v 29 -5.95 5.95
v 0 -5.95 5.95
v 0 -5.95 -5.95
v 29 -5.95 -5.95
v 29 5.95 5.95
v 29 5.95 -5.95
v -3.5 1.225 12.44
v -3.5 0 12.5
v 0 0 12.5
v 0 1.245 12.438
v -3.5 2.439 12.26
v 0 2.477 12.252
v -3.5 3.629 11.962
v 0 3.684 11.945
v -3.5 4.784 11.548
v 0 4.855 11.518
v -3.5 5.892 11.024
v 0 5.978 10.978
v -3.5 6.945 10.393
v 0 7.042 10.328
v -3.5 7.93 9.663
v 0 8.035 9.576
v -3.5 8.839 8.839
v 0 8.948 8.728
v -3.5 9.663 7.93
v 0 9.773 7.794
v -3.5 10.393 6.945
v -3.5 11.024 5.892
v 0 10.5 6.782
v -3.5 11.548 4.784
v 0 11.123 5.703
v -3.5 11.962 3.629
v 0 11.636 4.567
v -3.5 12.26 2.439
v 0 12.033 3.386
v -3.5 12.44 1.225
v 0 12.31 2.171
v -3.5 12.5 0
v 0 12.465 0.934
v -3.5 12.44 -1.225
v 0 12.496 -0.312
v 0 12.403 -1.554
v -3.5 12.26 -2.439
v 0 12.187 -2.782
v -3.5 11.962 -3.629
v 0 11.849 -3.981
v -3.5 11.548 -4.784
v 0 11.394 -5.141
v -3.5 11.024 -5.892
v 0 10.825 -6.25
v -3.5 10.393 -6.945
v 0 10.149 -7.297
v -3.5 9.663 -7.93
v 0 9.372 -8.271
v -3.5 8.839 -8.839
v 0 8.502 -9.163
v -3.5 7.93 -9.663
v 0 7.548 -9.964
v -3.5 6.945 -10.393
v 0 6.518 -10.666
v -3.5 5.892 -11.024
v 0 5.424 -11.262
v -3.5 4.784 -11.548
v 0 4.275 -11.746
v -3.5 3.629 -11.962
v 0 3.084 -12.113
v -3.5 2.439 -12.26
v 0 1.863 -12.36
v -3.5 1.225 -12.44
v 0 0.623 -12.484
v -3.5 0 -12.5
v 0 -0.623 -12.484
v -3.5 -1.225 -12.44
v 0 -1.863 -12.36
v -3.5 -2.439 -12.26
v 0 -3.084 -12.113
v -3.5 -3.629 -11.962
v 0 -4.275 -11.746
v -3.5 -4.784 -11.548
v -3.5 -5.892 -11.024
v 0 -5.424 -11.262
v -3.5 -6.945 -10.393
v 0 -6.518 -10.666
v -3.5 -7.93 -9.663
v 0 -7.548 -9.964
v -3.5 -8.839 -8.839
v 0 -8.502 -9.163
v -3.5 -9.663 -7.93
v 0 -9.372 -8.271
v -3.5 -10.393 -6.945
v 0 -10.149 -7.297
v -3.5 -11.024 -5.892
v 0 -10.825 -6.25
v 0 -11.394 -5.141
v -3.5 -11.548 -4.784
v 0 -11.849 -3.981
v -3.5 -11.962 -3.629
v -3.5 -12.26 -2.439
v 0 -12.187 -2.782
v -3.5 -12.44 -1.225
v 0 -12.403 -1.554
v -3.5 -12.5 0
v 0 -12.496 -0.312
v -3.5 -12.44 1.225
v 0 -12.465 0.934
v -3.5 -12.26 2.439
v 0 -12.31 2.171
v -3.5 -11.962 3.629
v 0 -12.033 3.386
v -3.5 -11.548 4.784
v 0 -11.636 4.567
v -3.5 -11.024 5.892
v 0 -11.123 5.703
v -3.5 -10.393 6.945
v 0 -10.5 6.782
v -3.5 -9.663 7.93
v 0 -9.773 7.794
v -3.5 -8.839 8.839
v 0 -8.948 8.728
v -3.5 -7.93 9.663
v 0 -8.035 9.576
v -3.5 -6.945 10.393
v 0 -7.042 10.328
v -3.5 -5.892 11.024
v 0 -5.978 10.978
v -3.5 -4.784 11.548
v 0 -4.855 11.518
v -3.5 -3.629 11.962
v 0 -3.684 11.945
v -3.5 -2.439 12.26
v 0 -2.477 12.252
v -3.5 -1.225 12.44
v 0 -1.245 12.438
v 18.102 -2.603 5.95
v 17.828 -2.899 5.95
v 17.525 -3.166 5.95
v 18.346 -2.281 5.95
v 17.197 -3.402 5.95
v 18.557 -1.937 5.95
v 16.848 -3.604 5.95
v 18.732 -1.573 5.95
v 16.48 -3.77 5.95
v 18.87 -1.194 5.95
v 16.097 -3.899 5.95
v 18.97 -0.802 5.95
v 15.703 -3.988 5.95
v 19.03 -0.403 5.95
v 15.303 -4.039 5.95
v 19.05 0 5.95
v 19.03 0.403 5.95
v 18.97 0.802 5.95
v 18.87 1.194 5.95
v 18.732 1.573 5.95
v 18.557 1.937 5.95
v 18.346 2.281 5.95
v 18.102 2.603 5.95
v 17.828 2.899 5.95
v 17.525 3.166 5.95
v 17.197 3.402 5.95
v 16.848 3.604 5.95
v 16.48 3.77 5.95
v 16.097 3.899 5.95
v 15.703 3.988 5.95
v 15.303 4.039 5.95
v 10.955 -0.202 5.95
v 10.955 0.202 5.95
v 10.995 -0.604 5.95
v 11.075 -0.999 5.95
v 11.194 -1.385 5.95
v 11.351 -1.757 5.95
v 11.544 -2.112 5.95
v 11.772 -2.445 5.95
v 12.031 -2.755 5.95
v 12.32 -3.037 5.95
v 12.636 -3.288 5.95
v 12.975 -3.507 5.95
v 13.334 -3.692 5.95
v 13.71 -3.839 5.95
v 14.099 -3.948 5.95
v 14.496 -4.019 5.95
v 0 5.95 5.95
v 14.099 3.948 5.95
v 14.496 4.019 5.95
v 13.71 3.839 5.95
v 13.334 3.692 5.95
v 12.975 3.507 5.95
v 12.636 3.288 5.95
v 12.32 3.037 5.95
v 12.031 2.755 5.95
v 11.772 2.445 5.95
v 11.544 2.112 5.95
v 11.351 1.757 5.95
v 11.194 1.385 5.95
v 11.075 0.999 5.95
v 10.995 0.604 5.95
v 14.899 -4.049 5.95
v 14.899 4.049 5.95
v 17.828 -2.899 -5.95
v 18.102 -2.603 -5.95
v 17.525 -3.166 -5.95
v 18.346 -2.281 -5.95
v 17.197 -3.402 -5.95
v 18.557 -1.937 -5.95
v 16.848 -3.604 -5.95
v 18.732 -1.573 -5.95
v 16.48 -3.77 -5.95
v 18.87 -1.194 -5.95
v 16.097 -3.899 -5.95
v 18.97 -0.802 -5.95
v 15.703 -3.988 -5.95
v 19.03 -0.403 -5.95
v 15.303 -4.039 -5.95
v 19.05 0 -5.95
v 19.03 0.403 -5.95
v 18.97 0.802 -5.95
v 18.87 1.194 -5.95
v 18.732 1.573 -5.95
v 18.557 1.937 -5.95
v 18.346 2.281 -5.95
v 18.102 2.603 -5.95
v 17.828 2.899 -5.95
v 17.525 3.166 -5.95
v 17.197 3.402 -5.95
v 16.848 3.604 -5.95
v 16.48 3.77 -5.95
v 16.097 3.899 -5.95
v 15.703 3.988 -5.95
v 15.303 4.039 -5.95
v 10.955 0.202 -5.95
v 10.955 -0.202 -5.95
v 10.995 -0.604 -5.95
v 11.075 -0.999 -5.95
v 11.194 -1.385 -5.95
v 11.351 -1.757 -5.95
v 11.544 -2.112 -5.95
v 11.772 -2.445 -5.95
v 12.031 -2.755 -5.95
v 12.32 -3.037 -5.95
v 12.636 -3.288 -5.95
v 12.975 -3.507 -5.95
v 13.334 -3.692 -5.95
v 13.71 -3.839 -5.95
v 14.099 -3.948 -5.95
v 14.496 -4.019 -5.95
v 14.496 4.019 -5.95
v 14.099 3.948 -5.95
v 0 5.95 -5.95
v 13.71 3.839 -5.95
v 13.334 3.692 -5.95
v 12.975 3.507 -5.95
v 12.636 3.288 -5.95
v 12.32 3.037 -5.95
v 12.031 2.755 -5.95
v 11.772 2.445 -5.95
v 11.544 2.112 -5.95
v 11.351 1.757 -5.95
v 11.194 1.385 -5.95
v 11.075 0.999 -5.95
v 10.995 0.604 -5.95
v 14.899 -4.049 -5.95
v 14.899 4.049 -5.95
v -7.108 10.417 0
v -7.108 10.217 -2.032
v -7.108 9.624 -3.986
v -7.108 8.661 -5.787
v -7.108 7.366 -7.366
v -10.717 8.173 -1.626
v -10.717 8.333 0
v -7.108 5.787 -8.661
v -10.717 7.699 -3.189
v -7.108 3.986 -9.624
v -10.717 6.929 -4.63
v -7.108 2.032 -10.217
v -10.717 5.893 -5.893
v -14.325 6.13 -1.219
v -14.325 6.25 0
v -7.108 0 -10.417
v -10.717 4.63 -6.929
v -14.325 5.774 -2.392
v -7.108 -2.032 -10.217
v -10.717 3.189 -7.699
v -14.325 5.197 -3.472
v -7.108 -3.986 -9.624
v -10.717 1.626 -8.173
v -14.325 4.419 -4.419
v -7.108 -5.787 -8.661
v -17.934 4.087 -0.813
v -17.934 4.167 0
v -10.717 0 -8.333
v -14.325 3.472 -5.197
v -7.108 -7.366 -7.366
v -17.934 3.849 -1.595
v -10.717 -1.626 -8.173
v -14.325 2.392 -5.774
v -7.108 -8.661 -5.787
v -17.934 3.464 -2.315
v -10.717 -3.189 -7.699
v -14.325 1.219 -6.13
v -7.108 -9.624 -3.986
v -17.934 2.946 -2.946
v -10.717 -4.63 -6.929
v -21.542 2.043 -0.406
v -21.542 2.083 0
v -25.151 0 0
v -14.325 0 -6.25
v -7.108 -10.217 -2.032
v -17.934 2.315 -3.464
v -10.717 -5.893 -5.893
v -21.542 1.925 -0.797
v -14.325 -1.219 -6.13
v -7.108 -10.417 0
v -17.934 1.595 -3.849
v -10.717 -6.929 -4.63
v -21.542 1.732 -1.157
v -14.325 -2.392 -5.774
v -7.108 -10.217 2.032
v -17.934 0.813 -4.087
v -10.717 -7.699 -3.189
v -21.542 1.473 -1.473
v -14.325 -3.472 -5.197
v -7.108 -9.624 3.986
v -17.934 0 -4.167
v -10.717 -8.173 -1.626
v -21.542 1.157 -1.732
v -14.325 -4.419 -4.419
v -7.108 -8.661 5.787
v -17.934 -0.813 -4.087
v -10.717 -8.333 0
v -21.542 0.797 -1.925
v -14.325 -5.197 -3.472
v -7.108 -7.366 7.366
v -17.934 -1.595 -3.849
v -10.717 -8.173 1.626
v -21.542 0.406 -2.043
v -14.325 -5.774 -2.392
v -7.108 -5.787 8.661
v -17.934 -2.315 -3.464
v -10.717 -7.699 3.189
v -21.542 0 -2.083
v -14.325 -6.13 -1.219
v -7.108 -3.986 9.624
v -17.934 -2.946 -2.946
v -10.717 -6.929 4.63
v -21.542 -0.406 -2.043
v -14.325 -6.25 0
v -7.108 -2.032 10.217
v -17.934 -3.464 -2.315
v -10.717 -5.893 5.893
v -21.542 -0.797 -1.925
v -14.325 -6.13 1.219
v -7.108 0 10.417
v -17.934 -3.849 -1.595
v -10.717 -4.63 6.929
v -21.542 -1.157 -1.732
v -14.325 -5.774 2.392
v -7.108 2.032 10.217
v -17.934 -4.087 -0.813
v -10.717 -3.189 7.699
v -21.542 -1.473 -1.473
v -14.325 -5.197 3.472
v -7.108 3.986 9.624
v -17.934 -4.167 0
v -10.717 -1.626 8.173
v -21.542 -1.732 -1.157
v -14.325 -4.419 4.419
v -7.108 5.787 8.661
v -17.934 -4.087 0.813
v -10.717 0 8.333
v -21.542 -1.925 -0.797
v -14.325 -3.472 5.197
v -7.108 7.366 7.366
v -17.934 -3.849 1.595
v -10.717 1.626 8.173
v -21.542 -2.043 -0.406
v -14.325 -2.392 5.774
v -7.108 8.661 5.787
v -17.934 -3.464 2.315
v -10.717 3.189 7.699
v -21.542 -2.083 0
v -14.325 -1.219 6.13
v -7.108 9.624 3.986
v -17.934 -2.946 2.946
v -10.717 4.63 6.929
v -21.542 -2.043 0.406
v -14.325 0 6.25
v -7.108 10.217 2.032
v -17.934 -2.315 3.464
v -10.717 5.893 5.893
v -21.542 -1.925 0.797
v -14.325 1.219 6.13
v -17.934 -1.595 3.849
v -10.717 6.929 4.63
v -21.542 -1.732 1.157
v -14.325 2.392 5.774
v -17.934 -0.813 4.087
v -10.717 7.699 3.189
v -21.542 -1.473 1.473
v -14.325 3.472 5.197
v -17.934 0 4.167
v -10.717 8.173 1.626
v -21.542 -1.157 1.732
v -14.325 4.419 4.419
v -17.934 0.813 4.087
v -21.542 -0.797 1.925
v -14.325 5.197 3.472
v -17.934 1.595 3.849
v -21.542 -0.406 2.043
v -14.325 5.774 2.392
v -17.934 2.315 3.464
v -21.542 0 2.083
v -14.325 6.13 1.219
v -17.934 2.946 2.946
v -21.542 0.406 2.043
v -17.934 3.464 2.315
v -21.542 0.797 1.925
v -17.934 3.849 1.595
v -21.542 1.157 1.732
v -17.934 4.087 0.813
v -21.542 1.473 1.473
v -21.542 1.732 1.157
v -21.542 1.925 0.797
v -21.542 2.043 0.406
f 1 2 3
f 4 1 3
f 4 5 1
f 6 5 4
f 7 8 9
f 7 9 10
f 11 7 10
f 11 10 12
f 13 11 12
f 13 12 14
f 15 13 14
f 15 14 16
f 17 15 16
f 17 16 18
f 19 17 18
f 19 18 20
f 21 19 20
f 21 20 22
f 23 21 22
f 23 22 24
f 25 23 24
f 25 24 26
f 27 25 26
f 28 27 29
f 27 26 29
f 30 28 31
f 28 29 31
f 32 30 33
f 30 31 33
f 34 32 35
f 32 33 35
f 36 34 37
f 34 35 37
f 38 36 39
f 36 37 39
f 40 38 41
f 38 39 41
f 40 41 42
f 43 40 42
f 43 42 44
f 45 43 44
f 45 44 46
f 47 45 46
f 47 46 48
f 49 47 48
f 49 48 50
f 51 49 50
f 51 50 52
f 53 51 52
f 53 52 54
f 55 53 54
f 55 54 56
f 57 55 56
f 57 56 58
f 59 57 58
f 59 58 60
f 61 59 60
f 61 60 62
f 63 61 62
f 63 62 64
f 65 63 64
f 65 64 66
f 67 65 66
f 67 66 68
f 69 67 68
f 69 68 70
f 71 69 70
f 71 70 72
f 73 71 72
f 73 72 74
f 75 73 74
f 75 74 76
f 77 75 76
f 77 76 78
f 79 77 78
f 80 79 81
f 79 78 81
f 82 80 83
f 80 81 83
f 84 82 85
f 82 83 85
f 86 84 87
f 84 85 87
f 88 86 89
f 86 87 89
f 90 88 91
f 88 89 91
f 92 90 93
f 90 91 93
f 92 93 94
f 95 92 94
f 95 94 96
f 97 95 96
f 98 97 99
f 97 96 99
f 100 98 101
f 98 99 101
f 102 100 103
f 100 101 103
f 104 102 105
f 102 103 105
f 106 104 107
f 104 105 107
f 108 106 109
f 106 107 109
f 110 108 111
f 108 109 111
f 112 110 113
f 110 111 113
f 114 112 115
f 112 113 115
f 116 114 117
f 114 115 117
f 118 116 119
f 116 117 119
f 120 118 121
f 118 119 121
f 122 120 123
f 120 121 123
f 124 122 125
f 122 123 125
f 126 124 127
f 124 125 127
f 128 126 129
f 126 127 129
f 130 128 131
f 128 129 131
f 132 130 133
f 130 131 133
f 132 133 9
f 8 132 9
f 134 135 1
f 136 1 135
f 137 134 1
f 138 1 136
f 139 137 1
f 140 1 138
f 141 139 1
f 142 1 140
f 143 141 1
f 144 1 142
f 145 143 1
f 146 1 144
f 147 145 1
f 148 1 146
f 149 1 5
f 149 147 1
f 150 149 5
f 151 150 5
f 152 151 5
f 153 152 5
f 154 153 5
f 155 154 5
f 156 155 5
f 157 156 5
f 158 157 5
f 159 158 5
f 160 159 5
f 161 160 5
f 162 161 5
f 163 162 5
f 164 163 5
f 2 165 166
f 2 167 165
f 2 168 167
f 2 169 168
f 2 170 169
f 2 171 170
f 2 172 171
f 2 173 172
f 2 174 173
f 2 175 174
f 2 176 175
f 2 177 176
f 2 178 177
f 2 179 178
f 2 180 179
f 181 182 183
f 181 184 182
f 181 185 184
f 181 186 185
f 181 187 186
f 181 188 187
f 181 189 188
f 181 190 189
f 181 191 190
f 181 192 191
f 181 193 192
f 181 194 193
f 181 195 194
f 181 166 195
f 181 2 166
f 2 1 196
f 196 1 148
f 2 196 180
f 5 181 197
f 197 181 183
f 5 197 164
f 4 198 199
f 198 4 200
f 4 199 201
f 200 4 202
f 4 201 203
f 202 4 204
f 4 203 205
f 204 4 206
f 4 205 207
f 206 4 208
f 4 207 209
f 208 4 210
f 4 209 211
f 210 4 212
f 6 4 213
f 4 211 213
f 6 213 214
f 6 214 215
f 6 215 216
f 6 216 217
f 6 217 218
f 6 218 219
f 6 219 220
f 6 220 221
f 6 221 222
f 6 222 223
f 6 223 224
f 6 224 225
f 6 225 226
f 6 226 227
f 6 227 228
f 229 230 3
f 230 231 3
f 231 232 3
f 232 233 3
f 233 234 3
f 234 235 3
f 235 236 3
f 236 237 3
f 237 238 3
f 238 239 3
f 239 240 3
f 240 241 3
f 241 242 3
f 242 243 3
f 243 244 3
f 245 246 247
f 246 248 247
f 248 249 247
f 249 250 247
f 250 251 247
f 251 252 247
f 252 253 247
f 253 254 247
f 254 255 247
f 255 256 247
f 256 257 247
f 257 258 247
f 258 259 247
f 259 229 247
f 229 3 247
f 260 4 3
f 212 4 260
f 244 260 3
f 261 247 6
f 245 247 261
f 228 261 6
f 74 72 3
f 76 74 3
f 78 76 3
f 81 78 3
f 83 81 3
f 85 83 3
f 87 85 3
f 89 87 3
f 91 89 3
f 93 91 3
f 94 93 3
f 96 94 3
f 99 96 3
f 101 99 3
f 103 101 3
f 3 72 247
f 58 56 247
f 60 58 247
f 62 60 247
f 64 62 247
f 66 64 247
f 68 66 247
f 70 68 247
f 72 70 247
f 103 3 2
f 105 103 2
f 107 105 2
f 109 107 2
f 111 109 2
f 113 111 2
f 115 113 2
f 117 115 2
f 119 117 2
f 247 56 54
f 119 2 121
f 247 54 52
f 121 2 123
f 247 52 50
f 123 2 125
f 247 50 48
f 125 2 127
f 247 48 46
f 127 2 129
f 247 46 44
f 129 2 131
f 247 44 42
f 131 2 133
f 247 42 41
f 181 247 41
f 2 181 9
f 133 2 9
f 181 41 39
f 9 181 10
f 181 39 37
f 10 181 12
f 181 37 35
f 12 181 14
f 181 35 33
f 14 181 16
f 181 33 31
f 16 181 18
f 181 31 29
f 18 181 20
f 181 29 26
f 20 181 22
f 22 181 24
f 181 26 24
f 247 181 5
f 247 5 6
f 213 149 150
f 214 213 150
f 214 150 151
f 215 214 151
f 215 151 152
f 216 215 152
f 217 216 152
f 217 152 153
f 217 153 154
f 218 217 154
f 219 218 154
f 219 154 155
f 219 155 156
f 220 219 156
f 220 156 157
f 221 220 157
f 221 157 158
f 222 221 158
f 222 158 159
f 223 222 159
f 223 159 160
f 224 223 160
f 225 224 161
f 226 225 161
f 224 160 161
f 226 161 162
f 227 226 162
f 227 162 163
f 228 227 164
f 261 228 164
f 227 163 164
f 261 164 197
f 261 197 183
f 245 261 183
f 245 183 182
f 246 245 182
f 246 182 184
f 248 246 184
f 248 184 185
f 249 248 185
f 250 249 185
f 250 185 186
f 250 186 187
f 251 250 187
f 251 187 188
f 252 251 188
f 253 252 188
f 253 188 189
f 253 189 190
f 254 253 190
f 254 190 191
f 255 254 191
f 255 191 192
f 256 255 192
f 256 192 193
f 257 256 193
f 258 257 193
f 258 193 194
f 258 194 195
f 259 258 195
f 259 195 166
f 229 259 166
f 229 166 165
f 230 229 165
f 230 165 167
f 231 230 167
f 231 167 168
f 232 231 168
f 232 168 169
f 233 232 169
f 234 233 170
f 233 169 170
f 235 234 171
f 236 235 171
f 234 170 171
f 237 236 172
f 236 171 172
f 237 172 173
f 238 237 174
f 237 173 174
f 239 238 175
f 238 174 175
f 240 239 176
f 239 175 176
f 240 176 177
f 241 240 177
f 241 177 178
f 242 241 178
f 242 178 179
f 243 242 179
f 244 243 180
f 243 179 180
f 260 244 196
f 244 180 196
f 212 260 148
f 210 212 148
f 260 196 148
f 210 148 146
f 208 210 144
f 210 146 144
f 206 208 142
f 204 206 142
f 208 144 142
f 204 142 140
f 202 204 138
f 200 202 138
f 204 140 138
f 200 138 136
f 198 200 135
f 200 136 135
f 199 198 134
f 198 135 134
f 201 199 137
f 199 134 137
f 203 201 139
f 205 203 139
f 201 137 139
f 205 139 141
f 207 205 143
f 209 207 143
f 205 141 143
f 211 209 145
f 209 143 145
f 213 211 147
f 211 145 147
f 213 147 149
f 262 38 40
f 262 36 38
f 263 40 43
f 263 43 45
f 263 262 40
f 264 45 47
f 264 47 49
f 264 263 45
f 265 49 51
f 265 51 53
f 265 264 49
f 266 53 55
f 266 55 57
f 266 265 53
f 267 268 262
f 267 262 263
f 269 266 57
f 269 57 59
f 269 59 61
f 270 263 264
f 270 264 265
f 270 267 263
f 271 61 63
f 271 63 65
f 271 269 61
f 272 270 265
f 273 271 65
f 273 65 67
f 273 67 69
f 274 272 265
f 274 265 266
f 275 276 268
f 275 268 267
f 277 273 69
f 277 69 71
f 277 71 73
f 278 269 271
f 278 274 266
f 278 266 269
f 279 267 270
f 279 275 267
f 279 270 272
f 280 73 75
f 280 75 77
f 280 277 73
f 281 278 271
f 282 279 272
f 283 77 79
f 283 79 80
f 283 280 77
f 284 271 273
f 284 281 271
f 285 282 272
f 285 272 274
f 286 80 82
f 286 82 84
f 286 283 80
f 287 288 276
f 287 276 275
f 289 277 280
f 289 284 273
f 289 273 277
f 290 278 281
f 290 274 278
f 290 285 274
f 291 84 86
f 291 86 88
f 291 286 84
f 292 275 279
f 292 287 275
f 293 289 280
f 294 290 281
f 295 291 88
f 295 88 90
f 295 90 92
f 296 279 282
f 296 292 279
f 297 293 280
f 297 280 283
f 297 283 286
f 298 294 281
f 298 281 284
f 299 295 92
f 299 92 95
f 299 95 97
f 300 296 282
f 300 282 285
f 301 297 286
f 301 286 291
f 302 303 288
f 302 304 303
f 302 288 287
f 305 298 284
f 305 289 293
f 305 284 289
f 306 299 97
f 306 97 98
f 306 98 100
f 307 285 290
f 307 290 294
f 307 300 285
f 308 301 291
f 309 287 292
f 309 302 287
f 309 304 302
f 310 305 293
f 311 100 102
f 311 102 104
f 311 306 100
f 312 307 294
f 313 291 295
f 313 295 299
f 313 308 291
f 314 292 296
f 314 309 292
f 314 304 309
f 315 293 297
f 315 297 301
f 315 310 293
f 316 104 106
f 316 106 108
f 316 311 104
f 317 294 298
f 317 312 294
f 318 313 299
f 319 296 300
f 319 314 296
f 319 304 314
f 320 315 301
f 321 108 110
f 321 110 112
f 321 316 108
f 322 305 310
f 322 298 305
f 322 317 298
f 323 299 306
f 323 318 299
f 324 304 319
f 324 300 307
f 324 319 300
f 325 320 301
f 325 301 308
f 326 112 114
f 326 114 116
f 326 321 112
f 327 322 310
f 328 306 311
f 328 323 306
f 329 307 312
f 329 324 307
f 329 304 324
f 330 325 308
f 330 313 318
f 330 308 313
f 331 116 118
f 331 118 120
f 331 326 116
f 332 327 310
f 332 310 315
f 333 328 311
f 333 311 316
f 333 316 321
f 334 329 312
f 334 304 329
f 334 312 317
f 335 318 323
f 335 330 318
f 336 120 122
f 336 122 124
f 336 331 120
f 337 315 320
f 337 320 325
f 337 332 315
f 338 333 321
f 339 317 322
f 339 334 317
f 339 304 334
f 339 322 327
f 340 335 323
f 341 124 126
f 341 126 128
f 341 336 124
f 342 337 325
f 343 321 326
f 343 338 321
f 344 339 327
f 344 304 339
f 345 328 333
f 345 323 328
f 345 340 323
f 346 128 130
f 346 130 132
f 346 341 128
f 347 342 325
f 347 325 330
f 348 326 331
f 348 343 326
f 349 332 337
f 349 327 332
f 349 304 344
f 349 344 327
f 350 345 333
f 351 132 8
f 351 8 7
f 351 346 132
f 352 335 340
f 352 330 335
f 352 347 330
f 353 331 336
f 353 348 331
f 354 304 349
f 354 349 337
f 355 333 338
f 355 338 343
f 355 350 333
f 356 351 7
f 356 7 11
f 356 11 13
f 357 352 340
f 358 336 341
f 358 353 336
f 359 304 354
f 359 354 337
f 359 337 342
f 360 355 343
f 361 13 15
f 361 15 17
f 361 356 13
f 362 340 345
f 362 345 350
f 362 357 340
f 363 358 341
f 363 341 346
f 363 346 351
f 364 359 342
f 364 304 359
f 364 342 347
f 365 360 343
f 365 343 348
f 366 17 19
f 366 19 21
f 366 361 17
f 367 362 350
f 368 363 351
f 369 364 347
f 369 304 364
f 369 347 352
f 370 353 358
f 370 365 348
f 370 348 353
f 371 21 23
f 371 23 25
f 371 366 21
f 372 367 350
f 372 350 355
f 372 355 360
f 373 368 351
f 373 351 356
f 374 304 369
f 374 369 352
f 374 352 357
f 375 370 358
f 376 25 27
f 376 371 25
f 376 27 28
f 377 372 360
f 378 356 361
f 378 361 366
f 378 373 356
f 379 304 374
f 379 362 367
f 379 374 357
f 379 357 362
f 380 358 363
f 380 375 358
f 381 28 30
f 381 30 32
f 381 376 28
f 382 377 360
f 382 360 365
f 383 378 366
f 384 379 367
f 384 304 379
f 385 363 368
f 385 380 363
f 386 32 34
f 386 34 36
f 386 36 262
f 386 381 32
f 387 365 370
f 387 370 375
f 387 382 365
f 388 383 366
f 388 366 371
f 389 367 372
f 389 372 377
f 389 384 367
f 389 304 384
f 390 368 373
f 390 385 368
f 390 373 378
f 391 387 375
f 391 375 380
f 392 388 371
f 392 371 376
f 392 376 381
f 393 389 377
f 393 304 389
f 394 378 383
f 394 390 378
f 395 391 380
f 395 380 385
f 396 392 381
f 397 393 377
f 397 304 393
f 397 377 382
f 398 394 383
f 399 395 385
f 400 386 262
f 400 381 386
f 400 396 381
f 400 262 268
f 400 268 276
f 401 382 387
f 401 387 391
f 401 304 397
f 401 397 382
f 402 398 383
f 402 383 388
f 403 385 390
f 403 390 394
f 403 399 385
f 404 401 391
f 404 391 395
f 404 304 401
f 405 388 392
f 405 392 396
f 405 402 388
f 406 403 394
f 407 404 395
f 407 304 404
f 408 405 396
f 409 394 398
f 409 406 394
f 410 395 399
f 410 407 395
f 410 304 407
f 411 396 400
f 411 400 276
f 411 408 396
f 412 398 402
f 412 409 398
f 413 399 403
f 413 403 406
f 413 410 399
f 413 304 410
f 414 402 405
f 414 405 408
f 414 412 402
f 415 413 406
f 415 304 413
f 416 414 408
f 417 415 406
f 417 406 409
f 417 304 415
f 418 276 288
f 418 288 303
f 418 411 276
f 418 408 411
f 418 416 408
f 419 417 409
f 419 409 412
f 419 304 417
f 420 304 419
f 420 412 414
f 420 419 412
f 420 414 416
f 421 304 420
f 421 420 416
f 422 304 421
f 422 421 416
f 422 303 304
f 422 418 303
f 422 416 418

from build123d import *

# Parameters (mm, degrees)
SKETCH1_W                      = 11.9
SKETCH1_H                      = 11.9
BOSS_EXTRUDE1_DEPTH            = 29
CUT_EXTRUDE1_REACH             = 13.9
SKETCH2_R                      = 4.05
CUT_EXTRUDE1_DIRECTION_2_DEPTH = 1
SKETCH3_R                      = 12.5
BOSS_EXTRUDE2_DEPTH            = 3.5


with BuildPart() as part:
    # Sketch1 → Boss-Extrude1 (new body)
    with BuildSketch(Plane(origin=(0, 0, 0), x_dir=(0, 0, -1), z_dir=(1, 0, 0))):
        Rectangle(SKETCH1_W, SKETCH1_H)
    extrude(amount=BOSS_EXTRUDE1_DEPTH)

    # Sketch2 → Cut-Extrude1 (cut, up to next)
    with BuildSketch(Plane.XY.offset(5.95), mode=Mode.PRIVATE) as cut_extrude1_sk1:
        with Locations((15, 0)):
            Circle(SKETCH2_R)
    cut_extrude1_tool1 = extrude(cut_extrude1_sk1.sketch, amount=-CUT_EXTRUDE1_REACH, mode=Mode.PRIVATE) & part.part
    add(cut_extrude1_tool1.solids().sort_by_distance((15, 0, 5.95))[0], mode=Mode.SUBTRACT)

    # Sketch2 → Cut-Extrude1 direction 2 (cut)
    with BuildSketch(Plane.XY.offset(5.95)):
        with Locations((15, 0)):
            Circle(SKETCH2_R)
    extrude(amount=CUT_EXTRUDE1_DIRECTION_2_DEPTH, mode=Mode.SUBTRACT)

    # Sketch3 → Boss-Extrude2 (add)
    with BuildSketch(Plane.ZY):
        Circle(SKETCH3_R)
    extrude(amount=BOSS_EXTRUDE2_DEPTH)

    # Sketch4 → Revolve1 (revolve)
    with BuildSketch(Plane.XY):
        Polygon((-3.5, 0), (-3.5, 12.5), (-25.150635095, 0), align=None)
    revolve(axis=Axis((0, 0, 0), (-1, 0, 0)))


solid = part.part
